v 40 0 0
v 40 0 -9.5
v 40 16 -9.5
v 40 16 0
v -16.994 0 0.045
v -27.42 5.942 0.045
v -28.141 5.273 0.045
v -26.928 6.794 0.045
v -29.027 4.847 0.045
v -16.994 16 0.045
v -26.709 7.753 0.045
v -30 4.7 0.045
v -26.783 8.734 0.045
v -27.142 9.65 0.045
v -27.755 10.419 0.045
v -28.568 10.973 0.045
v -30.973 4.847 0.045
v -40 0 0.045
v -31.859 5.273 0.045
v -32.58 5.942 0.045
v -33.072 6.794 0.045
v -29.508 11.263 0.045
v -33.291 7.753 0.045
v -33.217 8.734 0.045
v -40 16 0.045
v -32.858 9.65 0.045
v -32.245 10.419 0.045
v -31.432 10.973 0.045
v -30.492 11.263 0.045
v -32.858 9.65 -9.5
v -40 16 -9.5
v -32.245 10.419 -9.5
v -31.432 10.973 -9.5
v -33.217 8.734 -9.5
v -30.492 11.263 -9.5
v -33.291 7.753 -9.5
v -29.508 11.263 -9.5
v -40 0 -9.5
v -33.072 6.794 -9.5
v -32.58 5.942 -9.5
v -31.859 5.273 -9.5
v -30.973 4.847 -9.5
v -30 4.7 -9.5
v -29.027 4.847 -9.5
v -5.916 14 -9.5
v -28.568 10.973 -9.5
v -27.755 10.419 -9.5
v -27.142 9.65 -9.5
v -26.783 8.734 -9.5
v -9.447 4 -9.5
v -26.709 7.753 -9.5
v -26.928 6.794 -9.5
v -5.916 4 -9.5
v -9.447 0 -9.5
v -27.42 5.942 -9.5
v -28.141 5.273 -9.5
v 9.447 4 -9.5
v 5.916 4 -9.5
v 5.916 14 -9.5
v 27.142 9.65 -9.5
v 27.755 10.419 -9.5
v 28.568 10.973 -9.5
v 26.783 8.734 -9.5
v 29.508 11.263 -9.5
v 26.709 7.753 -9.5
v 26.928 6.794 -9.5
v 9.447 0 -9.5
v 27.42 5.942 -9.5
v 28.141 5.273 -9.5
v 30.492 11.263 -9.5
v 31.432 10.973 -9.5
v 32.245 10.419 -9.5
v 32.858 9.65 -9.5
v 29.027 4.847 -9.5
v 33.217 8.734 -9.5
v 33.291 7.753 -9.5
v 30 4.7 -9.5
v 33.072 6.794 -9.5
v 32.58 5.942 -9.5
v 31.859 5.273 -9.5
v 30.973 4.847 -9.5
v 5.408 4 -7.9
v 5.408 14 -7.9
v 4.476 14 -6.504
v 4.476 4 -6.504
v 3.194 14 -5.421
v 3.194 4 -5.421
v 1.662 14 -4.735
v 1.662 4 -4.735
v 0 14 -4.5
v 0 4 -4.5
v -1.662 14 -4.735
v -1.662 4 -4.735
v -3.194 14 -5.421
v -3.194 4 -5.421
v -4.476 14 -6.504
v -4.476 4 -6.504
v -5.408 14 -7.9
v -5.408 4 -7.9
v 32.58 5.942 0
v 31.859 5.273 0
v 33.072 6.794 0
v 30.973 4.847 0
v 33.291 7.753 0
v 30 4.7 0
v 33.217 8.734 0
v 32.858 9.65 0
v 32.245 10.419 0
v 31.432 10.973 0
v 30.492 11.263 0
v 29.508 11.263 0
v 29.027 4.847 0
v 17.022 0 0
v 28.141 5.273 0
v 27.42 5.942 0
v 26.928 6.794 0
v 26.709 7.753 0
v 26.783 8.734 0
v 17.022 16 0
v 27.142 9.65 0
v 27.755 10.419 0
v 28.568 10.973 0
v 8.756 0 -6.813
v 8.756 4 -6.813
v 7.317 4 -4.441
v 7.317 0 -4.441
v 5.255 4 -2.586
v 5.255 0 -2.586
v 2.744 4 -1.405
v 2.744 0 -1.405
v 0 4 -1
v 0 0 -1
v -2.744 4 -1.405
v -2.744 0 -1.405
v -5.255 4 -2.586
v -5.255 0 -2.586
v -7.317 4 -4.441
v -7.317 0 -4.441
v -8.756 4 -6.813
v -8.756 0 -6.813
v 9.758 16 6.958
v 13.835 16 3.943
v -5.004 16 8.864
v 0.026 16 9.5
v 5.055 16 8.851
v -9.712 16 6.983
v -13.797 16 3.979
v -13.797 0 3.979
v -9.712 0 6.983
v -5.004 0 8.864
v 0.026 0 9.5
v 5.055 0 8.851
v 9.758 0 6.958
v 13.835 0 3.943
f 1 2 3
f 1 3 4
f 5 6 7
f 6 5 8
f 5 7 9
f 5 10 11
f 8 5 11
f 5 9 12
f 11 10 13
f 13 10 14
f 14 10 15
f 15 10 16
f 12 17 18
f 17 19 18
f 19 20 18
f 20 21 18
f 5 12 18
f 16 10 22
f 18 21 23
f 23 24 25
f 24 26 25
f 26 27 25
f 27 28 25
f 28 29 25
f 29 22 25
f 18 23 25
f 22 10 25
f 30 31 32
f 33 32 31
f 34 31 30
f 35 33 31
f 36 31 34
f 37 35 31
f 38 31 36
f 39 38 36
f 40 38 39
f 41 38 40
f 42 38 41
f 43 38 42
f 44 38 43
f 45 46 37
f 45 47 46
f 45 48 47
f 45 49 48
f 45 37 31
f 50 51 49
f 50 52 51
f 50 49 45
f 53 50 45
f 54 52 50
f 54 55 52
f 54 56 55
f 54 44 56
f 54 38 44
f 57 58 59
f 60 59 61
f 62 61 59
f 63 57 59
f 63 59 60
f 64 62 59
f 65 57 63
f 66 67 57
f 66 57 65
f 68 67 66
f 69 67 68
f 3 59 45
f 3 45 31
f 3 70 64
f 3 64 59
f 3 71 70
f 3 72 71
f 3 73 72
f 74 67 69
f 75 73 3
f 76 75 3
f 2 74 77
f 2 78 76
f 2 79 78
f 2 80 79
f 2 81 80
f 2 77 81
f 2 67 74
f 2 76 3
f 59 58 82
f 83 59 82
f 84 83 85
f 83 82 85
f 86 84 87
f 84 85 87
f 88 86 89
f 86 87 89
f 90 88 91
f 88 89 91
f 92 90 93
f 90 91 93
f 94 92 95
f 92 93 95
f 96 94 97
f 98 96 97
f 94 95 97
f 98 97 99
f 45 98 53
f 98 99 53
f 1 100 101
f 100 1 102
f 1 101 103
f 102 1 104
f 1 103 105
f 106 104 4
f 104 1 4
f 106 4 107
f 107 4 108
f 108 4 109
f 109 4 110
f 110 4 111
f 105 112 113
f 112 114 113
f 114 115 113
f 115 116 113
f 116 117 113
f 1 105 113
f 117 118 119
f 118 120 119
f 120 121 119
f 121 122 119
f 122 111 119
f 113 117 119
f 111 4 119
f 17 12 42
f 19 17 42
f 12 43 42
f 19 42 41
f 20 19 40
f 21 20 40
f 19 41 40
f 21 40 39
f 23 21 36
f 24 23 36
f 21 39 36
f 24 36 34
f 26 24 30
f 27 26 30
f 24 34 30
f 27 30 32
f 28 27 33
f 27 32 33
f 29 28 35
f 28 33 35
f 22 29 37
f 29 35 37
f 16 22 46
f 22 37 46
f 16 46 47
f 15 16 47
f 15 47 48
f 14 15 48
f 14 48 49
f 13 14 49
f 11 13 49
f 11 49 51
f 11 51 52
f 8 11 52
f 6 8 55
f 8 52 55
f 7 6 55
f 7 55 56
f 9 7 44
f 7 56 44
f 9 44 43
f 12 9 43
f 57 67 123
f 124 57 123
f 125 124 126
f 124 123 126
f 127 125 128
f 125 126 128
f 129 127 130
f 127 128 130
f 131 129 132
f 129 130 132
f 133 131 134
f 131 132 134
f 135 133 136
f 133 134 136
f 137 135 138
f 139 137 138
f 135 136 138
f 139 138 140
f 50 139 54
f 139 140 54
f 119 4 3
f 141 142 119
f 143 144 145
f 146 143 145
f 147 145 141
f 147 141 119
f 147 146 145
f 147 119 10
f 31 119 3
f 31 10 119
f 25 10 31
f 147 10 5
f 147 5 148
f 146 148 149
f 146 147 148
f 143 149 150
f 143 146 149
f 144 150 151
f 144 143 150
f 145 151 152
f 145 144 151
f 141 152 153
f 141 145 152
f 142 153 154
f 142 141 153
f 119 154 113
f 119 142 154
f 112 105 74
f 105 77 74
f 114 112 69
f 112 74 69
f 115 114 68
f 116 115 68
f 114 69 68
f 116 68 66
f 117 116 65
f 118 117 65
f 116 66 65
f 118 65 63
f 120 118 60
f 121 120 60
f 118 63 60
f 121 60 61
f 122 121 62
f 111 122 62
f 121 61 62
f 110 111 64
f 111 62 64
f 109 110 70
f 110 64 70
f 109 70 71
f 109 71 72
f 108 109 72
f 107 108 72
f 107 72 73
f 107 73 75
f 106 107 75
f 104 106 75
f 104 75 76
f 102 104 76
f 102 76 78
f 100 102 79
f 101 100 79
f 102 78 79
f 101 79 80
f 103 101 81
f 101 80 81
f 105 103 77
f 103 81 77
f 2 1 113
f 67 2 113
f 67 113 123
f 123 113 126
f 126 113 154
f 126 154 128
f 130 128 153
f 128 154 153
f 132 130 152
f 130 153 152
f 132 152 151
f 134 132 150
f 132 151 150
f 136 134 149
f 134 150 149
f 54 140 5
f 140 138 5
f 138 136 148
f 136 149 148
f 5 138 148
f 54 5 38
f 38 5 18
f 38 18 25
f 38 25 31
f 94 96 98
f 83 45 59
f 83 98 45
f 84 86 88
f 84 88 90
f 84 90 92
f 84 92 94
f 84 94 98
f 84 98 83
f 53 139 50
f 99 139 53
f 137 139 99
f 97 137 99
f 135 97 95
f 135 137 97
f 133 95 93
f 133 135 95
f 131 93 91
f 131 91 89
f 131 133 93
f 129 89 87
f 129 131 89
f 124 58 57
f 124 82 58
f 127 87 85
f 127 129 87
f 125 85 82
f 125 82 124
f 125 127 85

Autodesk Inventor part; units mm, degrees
ref_plane "YZ Plane" through (0, 0, 0) normal (1, 0, 0) x (0, 1, 0)
ref_plane "XZ Plane" through (0, 0, 0) normal (0, 1, 0) x (-1, 0, 0)
ref_plane "XY Plane" through (0, 0, 0) normal (0, 0, 1) x (1, 0, 0)
sketch "Schizzo1" plane through (0, 0, 0) normal (0, 1, 0) x (-1, 0, 0)
  line L0 (40, -9.5) -> (-40, -9.5)
  line L1 (-40, -9.5) -> (-40, 9.5)
  line L2 (-40, 9.5) -> (40, 9.5)
  line L3 (40, 9.5) -> (40, -9.5)
  line L4 (40, -9.5) -> (-40, 9.5) construction
  line L5 (-40, -9.5) -> (40, 9.5) construction
  point P0 (0, 0)
  point P1 (0, 0)
  point P2 (0, 0)
  dimension "d0" = 19
  dimension "d15" = 80
extrude "Estrusione1" add sketch "Schizzo1" along normal blind 16
sketch "Schizzo2" plane through (0, 0, 0) normal (0, -1, 0) x (1, 0, 0)
  line L0 (40, -9.5) -> (-40, -9.5) projected
  line L1 (0, -9.5) -> (0, -10.5)
  line L2 (0, -9.5) -> (1, -9.5) construction
  circle A0 centre (0, -10.5) radius 9.5
  point P0 (0, 0)
  dimension "d9" = 1
  dimension "d10" = 90
  dimension "d11" = 19
extrude "Estrusione2" cut sketch "Schizzo2" against normal blind 4
sketch "Schizzo3" plane through (0, 4, 0) normal (0, -1, 0) x (1, 0, 0)
  line L0 (9.4472, -9.5) -> (-9.4472, -9.5) projected
  line L1 (0, -9.5) -> (0, -10.5)
  line L2 (0, -9.5) -> (1, -9.5) construction
  circle A0 centre (0, -10.5) radius 6
  point P0 (0, 0)
  point P1 (9.5, -24.5)
  point P2 (-9.5, -24.5)
  point P3 (-9.4472, -9.5)
  dimension "d12" = 1
  dimension "d13" = 90
  dimension "d14" = 12
extrude "Estrusione3" cut sketch "Schizzo3" against normal blind 10
sketch "Schizzo5" plane through (0, 16, 0) normal (0, 1, 0) x (1, 0, 0)
  line L0 (40, 9.5) -> (-40, 9.5) projected
  line L1 (0, 9.5) -> (0, 10.5)
  line L2 (0, 9.5) -> (1, 9.5) construction
  circle A0 centre (0, 10.5) radius 20
  line L3 (40, -9.5) -> (40, 9.5) projected
  line L4 (-40, -9.5) -> (40, -9.5) projected
  line L5 (0, -9.5) -> (40, -9.5)
  line L6 (40, -9.5) -> (40, 9.5) projected
  line L7 (40, 0) -> (17.022, 0)
  line L8 (0, -9.5) -> (-40, -9.5)
  line L9 (-40, -9.5) -> (-40, -0.0448)
  line L10 (-40, 9.5) -> (-40, -9.5) projected
  line L11 (-40, -9.5) -> (-40, -0.0448)
  line L12 (-16.9943, -0.0448) -> (-40, -0.0448)
  point P0 (0, 0)
  dimension "d16" = 1
  dimension "d17" = 90
extrude "Estrusione4" cut sketch "Schizzo5" against normal blind 30 contours L3 L4 A0 L7 | L4 L9 L12 A0
sketch "Schizzo6" plane through (-40, 16, 0.0448) normal (0, 0, 1) x (1, 0, 0)
  line L0 (40, -16) -> (40, -8)
  line L1 (40, -16) -> (48, -16) construction
  line L2 (40, -8) -> (10, -8)
  line L3 (40, -8) -> (70, -8)
  line L4 (40, -8) -> (70, -8) construction
  dimension "d20" = 8
  dimension "d21" = 90
  dimension "d22" = 30
  dimension "d23" = 90
  dimension "d24" = 30
  dimension "d25" = 0
hole "Foro1" at (30, 8, 0.0448) at (-30, 8, 0.0448) direction (0, 0, -1) diameter 6.6 end through all clearance for "Bullone a testa esagonale" size "M6" standard "ANSI - Profilo M Metrico"
properties part number "14_base_avanti"
